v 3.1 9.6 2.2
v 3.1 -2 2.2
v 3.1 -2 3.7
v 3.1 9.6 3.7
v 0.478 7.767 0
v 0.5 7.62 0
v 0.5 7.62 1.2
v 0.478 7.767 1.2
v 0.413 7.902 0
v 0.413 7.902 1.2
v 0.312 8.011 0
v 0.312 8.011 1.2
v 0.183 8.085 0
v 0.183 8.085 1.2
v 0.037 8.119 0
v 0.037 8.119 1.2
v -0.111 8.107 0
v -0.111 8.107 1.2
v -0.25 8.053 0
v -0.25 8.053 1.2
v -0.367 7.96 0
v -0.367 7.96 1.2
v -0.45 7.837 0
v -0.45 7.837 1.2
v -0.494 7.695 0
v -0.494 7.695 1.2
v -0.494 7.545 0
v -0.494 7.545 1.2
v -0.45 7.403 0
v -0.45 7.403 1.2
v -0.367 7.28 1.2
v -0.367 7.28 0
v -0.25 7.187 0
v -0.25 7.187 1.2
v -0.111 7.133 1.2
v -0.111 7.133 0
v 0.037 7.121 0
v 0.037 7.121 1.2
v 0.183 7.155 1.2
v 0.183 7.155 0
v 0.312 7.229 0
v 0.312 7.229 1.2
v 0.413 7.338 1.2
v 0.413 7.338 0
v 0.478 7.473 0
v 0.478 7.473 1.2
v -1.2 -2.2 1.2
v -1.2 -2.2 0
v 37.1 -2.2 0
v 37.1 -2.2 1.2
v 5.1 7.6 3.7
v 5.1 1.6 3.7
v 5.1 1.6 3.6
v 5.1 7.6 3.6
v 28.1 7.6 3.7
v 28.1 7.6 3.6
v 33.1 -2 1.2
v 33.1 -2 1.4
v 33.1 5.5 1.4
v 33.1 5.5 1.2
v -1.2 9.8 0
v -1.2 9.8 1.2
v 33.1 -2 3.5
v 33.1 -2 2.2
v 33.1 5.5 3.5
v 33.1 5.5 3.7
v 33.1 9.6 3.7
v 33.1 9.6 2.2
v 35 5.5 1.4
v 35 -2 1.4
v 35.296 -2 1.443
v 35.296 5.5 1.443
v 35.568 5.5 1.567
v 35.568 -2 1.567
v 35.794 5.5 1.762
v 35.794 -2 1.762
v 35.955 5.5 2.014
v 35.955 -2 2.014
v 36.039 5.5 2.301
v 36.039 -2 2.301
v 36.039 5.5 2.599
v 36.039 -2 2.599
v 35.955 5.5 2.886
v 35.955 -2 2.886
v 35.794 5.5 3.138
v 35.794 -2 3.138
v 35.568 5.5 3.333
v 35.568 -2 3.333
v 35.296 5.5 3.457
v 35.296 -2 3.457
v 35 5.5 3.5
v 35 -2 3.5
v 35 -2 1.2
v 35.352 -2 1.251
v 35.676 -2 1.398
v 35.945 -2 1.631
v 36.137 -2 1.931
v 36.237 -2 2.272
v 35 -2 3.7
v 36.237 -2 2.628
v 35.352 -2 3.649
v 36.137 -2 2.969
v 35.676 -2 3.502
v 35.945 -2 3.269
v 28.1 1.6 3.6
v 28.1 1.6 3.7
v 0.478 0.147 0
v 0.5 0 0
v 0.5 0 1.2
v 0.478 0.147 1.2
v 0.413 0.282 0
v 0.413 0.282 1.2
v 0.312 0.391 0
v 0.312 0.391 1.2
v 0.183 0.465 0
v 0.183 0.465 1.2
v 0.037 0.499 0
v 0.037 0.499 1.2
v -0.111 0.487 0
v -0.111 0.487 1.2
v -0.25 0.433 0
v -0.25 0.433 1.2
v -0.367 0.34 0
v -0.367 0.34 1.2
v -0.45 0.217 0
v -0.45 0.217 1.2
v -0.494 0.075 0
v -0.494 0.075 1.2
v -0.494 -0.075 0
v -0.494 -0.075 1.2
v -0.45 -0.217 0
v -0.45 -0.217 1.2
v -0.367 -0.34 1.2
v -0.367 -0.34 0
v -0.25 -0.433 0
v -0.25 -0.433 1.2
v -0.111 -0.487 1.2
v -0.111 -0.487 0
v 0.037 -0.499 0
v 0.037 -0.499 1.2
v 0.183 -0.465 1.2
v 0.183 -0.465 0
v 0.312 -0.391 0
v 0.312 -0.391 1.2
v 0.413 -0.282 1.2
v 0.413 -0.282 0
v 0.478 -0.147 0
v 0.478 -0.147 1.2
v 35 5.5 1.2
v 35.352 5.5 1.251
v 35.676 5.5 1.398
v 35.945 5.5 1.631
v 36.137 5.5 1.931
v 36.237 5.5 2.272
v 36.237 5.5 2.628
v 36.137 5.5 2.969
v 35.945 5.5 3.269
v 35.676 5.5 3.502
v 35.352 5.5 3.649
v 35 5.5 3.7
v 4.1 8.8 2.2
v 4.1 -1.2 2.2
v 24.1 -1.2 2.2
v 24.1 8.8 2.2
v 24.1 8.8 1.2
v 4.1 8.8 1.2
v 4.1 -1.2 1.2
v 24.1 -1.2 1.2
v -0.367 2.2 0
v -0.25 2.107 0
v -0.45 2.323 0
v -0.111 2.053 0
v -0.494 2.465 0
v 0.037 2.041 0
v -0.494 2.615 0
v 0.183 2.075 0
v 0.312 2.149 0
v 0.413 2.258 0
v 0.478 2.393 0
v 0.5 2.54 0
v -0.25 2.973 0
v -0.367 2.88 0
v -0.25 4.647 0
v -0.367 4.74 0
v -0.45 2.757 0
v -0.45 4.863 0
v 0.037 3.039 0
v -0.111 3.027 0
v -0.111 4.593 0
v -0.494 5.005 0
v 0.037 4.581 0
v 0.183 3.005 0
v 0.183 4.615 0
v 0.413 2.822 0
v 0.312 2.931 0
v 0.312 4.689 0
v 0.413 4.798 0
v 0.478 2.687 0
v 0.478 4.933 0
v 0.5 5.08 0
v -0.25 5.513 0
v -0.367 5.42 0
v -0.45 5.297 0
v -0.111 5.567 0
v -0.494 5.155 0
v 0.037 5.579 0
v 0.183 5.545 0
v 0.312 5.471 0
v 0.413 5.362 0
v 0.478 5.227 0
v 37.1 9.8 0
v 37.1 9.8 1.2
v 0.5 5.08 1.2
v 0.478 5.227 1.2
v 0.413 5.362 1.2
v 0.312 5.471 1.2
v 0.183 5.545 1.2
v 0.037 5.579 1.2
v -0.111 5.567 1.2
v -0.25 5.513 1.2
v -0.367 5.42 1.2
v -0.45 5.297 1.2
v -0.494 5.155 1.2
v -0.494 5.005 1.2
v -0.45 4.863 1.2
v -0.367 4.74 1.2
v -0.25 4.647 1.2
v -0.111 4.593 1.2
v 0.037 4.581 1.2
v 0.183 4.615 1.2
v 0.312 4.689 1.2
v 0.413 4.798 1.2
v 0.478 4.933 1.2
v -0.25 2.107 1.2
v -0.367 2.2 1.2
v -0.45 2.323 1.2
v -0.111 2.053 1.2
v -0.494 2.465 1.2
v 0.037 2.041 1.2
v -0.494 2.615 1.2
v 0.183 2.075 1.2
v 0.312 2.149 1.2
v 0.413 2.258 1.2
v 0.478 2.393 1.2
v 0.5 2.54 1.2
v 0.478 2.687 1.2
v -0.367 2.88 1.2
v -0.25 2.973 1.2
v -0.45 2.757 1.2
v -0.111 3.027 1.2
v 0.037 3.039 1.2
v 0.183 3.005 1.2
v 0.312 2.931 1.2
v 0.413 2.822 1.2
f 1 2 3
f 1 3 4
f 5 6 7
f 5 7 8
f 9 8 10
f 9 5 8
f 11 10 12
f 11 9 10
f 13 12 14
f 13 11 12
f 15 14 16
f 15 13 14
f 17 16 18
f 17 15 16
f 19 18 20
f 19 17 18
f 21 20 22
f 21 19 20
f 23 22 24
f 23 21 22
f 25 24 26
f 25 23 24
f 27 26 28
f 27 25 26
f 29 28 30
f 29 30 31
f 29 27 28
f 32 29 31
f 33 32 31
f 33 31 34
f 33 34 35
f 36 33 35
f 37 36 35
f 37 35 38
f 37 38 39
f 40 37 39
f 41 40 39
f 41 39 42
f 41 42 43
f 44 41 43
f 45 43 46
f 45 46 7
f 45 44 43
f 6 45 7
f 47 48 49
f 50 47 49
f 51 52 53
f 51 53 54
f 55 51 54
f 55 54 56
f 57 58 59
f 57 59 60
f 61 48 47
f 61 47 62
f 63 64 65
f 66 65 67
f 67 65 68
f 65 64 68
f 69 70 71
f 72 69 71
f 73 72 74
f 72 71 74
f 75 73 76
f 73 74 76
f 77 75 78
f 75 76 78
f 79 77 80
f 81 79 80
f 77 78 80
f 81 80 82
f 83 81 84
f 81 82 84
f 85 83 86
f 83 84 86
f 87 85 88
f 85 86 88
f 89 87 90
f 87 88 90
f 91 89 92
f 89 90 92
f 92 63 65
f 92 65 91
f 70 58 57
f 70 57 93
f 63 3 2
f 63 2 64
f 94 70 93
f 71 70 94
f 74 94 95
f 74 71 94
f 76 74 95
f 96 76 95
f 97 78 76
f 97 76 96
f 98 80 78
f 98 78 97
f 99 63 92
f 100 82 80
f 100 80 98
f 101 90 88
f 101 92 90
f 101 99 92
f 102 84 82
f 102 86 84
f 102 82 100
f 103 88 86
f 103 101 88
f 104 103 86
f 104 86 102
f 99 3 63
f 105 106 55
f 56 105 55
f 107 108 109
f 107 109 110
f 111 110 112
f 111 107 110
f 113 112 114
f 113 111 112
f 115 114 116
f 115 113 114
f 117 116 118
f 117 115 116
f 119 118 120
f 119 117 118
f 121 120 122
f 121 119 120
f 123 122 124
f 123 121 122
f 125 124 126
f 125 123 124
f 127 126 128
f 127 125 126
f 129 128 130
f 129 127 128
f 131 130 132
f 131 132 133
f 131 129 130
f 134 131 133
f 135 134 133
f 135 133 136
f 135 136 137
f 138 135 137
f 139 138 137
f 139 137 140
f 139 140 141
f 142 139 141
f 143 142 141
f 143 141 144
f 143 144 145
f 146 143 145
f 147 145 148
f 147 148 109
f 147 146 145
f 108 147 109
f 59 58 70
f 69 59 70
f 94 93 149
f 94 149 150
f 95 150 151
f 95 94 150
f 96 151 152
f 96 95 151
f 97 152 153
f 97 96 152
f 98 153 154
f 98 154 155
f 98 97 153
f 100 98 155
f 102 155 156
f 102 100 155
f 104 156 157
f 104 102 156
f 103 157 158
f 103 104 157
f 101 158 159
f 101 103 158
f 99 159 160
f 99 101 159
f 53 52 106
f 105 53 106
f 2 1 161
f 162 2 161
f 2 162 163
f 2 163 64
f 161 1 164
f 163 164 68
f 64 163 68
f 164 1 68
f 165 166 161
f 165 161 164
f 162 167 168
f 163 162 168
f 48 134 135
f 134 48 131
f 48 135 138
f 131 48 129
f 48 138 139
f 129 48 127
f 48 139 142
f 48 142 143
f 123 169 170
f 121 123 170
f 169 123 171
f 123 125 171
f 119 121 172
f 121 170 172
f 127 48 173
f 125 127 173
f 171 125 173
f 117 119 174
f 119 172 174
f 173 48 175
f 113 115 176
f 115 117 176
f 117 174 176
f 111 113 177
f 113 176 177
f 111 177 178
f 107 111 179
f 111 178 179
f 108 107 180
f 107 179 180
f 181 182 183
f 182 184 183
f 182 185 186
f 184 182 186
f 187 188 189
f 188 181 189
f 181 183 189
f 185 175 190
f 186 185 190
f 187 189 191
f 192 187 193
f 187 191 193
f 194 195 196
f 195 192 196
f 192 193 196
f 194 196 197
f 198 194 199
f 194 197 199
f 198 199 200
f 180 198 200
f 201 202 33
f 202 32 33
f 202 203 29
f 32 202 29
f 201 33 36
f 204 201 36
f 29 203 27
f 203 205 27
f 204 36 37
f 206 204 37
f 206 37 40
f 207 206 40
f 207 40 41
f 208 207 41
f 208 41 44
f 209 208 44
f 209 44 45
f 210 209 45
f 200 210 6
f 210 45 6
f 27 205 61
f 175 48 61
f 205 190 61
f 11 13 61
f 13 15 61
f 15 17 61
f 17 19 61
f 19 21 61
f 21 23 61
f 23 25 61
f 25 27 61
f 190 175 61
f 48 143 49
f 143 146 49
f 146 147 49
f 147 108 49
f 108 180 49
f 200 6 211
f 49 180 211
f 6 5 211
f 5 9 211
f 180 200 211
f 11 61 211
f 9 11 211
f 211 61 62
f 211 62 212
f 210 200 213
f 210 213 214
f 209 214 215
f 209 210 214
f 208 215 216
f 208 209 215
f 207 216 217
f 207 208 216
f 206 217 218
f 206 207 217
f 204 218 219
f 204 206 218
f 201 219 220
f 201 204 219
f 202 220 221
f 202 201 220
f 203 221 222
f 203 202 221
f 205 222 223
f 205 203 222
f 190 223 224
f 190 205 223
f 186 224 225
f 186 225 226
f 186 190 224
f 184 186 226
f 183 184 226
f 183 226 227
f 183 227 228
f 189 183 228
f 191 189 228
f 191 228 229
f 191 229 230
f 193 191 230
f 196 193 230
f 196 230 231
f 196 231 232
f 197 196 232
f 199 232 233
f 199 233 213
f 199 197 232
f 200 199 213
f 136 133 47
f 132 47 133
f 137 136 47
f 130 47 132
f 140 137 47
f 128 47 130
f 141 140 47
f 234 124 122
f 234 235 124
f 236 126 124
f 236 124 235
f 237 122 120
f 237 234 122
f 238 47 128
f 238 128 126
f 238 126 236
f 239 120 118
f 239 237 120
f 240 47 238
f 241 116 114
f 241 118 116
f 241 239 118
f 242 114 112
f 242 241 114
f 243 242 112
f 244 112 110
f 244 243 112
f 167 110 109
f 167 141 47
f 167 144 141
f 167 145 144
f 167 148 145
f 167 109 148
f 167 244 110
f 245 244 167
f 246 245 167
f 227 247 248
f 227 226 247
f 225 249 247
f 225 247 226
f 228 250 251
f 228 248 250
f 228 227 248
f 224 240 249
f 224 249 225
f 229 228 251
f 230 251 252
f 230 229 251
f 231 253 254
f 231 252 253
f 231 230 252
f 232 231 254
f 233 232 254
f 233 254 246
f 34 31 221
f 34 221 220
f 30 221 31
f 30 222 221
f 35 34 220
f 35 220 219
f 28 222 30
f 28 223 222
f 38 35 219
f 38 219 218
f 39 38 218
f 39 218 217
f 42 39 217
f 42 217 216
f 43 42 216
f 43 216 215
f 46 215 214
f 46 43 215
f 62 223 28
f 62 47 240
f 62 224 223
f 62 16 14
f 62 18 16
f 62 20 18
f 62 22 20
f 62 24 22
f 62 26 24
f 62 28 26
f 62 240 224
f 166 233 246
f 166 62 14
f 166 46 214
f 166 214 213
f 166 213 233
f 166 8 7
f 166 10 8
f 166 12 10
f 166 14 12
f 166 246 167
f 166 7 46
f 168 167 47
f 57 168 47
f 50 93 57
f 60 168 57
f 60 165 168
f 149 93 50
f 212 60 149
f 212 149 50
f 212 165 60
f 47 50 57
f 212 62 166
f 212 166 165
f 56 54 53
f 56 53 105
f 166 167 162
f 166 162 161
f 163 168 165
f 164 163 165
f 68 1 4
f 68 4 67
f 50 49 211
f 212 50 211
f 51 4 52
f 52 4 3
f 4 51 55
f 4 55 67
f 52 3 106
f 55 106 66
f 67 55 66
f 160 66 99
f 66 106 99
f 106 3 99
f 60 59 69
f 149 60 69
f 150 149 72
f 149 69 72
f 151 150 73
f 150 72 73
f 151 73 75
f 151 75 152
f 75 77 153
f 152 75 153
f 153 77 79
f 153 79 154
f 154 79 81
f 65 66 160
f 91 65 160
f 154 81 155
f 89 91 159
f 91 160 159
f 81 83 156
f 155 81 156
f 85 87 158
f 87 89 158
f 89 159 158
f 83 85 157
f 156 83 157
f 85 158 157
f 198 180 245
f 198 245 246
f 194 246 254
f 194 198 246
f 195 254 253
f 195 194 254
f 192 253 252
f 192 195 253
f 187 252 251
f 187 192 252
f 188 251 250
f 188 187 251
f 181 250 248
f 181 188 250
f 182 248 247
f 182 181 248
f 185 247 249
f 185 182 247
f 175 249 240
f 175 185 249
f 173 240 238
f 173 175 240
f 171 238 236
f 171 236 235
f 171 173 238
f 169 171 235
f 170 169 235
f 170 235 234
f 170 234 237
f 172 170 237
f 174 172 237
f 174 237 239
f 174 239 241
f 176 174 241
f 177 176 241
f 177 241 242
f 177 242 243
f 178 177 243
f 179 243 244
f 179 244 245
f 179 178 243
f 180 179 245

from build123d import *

# Parameters (mm, degrees)
SKETCH_W     = 38.3
SKETCH_H     = 12
SKETCH_R     = 0.5
PAD_DEPTH    = 1.2
SKETCH001_W  = 20
SKETCH001_H  = 10
PAD001_DEPTH = 1
SKETCH002_W  = 30
SKETCH002_H  = 11.6
PAD002_DEPTH = 1.5
PAD003_DEPTH = 7.5
SKETCH004_W  = 23
SKETCH004_H  = 6
POCKET_DEPTH = 0.1


with BuildPart() as part:
    # Sketch → Pad (new body)
    with BuildSketch(Plane.XY):
        with Locations((17.95, 3.8)):
            Rectangle(SKETCH_W, SKETCH_H)
        Circle(SKETCH_R, mode=Mode.SUBTRACT)
        with Locations((0, 2.54)):
            Circle(SKETCH_R, mode=Mode.SUBTRACT)
        with Locations((0, 5.08)):
            Circle(SKETCH_R, mode=Mode.SUBTRACT)
        with Locations((0, 7.62)):
            Circle(SKETCH_R, mode=Mode.SUBTRACT)
    extrude(amount=PAD_DEPTH)

    # Sketch001 (on Face10 of Pad) → Pad001 (join)
    with BuildSketch(Plane.XY.offset(1.2)):
        with Locations((14.1, 3.8)):
            Rectangle(SKETCH001_W, SKETCH001_H)
    extrude(amount=PAD001_DEPTH)

    # Sketch002 (on Face15 of Pad001) → Pad002 (join)
    with BuildSketch(Plane.XY.offset(2.2)):
        with Locations((18.1, 3.8)):
            Rectangle(SKETCH002_W, SKETCH002_H)
    extrude(amount=PAD002_DEPTH)

    # Sketch003 (on Face6 of Pad002) → Pad003 (join)
    with BuildSketch(Plane.XZ.offset(2)):
        with BuildLine():
            ThreePointArc((35, 1.2), (36.25, 2.45), (35, 3.7))
            Line((33.1, 3.7), (35, 3.7))
            Line((33.1, 3.7), (33.1, 3.5))
            Line((33.1, 3.5), (35, 3.5))
            ThreePointArc((35, 1.4), (36.05, 2.45), (35, 3.5))
            Line((33.1, 1.4), (35, 1.4))
            Line((33.1, 1.4), (33.1, 1.2))
            Line((33.1, 1.2), (35, 1.2))
        make_face()
    extrude(amount=-PAD003_DEPTH)

    # Sketch004 (on Face5 of Pad003) → Pocket (cut)
    with BuildSketch(Plane.XY.offset(3.7)):
        with Locations((16.6, 4.6)):
            Rectangle(SKETCH004_W, SKETCH004_H)
    extrude(amount=-POCKET_DEPTH, mode=Mode.SUBTRACT)


solid = part.part
